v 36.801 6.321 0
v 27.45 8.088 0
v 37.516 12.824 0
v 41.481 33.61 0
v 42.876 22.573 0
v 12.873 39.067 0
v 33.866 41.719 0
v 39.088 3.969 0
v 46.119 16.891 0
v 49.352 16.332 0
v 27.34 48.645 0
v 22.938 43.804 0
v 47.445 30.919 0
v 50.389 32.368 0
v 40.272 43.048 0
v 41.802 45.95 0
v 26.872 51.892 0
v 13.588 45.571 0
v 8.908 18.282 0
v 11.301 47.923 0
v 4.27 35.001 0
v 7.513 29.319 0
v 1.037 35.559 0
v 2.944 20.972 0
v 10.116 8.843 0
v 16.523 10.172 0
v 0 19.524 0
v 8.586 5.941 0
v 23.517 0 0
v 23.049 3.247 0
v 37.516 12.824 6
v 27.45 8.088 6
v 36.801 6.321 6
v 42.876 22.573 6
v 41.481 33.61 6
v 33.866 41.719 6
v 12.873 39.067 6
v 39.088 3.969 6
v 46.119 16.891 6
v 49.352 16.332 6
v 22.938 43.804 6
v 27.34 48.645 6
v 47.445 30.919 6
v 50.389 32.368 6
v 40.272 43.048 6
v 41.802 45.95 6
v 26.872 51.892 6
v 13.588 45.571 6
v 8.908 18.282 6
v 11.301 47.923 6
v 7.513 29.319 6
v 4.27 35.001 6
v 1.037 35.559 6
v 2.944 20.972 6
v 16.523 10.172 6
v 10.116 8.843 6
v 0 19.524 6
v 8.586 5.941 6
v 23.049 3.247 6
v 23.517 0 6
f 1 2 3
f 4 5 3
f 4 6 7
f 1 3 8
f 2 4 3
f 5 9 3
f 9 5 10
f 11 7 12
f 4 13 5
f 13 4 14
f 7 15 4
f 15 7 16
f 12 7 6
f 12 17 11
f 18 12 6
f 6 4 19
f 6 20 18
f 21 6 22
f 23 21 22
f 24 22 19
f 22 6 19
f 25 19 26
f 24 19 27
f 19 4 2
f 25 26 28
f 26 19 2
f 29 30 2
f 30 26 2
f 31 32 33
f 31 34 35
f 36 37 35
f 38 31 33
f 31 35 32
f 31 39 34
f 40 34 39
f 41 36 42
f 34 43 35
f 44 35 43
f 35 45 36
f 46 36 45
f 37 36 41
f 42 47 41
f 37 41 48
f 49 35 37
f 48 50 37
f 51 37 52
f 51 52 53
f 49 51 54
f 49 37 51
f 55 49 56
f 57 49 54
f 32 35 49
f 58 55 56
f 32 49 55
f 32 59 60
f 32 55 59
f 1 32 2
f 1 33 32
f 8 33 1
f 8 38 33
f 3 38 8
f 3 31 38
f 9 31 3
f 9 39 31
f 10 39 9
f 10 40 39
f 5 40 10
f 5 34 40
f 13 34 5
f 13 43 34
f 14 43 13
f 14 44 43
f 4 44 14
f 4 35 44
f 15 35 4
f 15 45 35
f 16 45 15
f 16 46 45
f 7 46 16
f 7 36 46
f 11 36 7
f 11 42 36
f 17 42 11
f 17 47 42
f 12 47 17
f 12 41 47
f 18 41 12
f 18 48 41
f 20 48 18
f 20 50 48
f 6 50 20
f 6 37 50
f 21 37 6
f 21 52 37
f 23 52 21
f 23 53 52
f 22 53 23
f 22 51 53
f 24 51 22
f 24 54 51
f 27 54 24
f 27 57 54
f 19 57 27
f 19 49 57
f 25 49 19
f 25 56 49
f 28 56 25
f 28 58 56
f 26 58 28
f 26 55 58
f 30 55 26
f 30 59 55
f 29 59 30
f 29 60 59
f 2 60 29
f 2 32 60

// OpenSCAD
$fn = 32;

// ----------------------------------------------------------------------
// Fan rotor section: 10 blades, 18 mm hub radius, 8 mm blades
// ----------------------------------------------------------------------

// --- parameters (mm) ---
profile_height = 6;       // extrusion height
profile_points = 30;      // points of the closed outline

profile = [[42.876, 22.573], [47.445, 30.919], [50.389, 32.368], [41.481, 33.61], [40.272, 43.048], [41.802, 45.95], [33.866, 41.719], [27.34, 48.645], [26.872, 51.892], [22.938, 43.804], [13.588, 45.571], [11.301, 47.923], [12.873, 39.067], [4.27, 35.001], [1.037, 35.559], [7.513, 29.319], [2.944, 20.972], [0, 19.524], [8.908, 18.282], [10.116, 8.843], [8.586, 5.941], [16.523, 10.172], [23.049, 3.247], [23.517, 0], [27.45, 8.088], [36.801, 6.321], [39.088, 3.969], [37.516, 12.824], [46.119, 16.891], [49.352, 16.332]];  // single closed polygon, 30 points, counter clockwise

// --- the one profile operation ---
linear_extrude(height = profile_height) polygon(points = profile);
